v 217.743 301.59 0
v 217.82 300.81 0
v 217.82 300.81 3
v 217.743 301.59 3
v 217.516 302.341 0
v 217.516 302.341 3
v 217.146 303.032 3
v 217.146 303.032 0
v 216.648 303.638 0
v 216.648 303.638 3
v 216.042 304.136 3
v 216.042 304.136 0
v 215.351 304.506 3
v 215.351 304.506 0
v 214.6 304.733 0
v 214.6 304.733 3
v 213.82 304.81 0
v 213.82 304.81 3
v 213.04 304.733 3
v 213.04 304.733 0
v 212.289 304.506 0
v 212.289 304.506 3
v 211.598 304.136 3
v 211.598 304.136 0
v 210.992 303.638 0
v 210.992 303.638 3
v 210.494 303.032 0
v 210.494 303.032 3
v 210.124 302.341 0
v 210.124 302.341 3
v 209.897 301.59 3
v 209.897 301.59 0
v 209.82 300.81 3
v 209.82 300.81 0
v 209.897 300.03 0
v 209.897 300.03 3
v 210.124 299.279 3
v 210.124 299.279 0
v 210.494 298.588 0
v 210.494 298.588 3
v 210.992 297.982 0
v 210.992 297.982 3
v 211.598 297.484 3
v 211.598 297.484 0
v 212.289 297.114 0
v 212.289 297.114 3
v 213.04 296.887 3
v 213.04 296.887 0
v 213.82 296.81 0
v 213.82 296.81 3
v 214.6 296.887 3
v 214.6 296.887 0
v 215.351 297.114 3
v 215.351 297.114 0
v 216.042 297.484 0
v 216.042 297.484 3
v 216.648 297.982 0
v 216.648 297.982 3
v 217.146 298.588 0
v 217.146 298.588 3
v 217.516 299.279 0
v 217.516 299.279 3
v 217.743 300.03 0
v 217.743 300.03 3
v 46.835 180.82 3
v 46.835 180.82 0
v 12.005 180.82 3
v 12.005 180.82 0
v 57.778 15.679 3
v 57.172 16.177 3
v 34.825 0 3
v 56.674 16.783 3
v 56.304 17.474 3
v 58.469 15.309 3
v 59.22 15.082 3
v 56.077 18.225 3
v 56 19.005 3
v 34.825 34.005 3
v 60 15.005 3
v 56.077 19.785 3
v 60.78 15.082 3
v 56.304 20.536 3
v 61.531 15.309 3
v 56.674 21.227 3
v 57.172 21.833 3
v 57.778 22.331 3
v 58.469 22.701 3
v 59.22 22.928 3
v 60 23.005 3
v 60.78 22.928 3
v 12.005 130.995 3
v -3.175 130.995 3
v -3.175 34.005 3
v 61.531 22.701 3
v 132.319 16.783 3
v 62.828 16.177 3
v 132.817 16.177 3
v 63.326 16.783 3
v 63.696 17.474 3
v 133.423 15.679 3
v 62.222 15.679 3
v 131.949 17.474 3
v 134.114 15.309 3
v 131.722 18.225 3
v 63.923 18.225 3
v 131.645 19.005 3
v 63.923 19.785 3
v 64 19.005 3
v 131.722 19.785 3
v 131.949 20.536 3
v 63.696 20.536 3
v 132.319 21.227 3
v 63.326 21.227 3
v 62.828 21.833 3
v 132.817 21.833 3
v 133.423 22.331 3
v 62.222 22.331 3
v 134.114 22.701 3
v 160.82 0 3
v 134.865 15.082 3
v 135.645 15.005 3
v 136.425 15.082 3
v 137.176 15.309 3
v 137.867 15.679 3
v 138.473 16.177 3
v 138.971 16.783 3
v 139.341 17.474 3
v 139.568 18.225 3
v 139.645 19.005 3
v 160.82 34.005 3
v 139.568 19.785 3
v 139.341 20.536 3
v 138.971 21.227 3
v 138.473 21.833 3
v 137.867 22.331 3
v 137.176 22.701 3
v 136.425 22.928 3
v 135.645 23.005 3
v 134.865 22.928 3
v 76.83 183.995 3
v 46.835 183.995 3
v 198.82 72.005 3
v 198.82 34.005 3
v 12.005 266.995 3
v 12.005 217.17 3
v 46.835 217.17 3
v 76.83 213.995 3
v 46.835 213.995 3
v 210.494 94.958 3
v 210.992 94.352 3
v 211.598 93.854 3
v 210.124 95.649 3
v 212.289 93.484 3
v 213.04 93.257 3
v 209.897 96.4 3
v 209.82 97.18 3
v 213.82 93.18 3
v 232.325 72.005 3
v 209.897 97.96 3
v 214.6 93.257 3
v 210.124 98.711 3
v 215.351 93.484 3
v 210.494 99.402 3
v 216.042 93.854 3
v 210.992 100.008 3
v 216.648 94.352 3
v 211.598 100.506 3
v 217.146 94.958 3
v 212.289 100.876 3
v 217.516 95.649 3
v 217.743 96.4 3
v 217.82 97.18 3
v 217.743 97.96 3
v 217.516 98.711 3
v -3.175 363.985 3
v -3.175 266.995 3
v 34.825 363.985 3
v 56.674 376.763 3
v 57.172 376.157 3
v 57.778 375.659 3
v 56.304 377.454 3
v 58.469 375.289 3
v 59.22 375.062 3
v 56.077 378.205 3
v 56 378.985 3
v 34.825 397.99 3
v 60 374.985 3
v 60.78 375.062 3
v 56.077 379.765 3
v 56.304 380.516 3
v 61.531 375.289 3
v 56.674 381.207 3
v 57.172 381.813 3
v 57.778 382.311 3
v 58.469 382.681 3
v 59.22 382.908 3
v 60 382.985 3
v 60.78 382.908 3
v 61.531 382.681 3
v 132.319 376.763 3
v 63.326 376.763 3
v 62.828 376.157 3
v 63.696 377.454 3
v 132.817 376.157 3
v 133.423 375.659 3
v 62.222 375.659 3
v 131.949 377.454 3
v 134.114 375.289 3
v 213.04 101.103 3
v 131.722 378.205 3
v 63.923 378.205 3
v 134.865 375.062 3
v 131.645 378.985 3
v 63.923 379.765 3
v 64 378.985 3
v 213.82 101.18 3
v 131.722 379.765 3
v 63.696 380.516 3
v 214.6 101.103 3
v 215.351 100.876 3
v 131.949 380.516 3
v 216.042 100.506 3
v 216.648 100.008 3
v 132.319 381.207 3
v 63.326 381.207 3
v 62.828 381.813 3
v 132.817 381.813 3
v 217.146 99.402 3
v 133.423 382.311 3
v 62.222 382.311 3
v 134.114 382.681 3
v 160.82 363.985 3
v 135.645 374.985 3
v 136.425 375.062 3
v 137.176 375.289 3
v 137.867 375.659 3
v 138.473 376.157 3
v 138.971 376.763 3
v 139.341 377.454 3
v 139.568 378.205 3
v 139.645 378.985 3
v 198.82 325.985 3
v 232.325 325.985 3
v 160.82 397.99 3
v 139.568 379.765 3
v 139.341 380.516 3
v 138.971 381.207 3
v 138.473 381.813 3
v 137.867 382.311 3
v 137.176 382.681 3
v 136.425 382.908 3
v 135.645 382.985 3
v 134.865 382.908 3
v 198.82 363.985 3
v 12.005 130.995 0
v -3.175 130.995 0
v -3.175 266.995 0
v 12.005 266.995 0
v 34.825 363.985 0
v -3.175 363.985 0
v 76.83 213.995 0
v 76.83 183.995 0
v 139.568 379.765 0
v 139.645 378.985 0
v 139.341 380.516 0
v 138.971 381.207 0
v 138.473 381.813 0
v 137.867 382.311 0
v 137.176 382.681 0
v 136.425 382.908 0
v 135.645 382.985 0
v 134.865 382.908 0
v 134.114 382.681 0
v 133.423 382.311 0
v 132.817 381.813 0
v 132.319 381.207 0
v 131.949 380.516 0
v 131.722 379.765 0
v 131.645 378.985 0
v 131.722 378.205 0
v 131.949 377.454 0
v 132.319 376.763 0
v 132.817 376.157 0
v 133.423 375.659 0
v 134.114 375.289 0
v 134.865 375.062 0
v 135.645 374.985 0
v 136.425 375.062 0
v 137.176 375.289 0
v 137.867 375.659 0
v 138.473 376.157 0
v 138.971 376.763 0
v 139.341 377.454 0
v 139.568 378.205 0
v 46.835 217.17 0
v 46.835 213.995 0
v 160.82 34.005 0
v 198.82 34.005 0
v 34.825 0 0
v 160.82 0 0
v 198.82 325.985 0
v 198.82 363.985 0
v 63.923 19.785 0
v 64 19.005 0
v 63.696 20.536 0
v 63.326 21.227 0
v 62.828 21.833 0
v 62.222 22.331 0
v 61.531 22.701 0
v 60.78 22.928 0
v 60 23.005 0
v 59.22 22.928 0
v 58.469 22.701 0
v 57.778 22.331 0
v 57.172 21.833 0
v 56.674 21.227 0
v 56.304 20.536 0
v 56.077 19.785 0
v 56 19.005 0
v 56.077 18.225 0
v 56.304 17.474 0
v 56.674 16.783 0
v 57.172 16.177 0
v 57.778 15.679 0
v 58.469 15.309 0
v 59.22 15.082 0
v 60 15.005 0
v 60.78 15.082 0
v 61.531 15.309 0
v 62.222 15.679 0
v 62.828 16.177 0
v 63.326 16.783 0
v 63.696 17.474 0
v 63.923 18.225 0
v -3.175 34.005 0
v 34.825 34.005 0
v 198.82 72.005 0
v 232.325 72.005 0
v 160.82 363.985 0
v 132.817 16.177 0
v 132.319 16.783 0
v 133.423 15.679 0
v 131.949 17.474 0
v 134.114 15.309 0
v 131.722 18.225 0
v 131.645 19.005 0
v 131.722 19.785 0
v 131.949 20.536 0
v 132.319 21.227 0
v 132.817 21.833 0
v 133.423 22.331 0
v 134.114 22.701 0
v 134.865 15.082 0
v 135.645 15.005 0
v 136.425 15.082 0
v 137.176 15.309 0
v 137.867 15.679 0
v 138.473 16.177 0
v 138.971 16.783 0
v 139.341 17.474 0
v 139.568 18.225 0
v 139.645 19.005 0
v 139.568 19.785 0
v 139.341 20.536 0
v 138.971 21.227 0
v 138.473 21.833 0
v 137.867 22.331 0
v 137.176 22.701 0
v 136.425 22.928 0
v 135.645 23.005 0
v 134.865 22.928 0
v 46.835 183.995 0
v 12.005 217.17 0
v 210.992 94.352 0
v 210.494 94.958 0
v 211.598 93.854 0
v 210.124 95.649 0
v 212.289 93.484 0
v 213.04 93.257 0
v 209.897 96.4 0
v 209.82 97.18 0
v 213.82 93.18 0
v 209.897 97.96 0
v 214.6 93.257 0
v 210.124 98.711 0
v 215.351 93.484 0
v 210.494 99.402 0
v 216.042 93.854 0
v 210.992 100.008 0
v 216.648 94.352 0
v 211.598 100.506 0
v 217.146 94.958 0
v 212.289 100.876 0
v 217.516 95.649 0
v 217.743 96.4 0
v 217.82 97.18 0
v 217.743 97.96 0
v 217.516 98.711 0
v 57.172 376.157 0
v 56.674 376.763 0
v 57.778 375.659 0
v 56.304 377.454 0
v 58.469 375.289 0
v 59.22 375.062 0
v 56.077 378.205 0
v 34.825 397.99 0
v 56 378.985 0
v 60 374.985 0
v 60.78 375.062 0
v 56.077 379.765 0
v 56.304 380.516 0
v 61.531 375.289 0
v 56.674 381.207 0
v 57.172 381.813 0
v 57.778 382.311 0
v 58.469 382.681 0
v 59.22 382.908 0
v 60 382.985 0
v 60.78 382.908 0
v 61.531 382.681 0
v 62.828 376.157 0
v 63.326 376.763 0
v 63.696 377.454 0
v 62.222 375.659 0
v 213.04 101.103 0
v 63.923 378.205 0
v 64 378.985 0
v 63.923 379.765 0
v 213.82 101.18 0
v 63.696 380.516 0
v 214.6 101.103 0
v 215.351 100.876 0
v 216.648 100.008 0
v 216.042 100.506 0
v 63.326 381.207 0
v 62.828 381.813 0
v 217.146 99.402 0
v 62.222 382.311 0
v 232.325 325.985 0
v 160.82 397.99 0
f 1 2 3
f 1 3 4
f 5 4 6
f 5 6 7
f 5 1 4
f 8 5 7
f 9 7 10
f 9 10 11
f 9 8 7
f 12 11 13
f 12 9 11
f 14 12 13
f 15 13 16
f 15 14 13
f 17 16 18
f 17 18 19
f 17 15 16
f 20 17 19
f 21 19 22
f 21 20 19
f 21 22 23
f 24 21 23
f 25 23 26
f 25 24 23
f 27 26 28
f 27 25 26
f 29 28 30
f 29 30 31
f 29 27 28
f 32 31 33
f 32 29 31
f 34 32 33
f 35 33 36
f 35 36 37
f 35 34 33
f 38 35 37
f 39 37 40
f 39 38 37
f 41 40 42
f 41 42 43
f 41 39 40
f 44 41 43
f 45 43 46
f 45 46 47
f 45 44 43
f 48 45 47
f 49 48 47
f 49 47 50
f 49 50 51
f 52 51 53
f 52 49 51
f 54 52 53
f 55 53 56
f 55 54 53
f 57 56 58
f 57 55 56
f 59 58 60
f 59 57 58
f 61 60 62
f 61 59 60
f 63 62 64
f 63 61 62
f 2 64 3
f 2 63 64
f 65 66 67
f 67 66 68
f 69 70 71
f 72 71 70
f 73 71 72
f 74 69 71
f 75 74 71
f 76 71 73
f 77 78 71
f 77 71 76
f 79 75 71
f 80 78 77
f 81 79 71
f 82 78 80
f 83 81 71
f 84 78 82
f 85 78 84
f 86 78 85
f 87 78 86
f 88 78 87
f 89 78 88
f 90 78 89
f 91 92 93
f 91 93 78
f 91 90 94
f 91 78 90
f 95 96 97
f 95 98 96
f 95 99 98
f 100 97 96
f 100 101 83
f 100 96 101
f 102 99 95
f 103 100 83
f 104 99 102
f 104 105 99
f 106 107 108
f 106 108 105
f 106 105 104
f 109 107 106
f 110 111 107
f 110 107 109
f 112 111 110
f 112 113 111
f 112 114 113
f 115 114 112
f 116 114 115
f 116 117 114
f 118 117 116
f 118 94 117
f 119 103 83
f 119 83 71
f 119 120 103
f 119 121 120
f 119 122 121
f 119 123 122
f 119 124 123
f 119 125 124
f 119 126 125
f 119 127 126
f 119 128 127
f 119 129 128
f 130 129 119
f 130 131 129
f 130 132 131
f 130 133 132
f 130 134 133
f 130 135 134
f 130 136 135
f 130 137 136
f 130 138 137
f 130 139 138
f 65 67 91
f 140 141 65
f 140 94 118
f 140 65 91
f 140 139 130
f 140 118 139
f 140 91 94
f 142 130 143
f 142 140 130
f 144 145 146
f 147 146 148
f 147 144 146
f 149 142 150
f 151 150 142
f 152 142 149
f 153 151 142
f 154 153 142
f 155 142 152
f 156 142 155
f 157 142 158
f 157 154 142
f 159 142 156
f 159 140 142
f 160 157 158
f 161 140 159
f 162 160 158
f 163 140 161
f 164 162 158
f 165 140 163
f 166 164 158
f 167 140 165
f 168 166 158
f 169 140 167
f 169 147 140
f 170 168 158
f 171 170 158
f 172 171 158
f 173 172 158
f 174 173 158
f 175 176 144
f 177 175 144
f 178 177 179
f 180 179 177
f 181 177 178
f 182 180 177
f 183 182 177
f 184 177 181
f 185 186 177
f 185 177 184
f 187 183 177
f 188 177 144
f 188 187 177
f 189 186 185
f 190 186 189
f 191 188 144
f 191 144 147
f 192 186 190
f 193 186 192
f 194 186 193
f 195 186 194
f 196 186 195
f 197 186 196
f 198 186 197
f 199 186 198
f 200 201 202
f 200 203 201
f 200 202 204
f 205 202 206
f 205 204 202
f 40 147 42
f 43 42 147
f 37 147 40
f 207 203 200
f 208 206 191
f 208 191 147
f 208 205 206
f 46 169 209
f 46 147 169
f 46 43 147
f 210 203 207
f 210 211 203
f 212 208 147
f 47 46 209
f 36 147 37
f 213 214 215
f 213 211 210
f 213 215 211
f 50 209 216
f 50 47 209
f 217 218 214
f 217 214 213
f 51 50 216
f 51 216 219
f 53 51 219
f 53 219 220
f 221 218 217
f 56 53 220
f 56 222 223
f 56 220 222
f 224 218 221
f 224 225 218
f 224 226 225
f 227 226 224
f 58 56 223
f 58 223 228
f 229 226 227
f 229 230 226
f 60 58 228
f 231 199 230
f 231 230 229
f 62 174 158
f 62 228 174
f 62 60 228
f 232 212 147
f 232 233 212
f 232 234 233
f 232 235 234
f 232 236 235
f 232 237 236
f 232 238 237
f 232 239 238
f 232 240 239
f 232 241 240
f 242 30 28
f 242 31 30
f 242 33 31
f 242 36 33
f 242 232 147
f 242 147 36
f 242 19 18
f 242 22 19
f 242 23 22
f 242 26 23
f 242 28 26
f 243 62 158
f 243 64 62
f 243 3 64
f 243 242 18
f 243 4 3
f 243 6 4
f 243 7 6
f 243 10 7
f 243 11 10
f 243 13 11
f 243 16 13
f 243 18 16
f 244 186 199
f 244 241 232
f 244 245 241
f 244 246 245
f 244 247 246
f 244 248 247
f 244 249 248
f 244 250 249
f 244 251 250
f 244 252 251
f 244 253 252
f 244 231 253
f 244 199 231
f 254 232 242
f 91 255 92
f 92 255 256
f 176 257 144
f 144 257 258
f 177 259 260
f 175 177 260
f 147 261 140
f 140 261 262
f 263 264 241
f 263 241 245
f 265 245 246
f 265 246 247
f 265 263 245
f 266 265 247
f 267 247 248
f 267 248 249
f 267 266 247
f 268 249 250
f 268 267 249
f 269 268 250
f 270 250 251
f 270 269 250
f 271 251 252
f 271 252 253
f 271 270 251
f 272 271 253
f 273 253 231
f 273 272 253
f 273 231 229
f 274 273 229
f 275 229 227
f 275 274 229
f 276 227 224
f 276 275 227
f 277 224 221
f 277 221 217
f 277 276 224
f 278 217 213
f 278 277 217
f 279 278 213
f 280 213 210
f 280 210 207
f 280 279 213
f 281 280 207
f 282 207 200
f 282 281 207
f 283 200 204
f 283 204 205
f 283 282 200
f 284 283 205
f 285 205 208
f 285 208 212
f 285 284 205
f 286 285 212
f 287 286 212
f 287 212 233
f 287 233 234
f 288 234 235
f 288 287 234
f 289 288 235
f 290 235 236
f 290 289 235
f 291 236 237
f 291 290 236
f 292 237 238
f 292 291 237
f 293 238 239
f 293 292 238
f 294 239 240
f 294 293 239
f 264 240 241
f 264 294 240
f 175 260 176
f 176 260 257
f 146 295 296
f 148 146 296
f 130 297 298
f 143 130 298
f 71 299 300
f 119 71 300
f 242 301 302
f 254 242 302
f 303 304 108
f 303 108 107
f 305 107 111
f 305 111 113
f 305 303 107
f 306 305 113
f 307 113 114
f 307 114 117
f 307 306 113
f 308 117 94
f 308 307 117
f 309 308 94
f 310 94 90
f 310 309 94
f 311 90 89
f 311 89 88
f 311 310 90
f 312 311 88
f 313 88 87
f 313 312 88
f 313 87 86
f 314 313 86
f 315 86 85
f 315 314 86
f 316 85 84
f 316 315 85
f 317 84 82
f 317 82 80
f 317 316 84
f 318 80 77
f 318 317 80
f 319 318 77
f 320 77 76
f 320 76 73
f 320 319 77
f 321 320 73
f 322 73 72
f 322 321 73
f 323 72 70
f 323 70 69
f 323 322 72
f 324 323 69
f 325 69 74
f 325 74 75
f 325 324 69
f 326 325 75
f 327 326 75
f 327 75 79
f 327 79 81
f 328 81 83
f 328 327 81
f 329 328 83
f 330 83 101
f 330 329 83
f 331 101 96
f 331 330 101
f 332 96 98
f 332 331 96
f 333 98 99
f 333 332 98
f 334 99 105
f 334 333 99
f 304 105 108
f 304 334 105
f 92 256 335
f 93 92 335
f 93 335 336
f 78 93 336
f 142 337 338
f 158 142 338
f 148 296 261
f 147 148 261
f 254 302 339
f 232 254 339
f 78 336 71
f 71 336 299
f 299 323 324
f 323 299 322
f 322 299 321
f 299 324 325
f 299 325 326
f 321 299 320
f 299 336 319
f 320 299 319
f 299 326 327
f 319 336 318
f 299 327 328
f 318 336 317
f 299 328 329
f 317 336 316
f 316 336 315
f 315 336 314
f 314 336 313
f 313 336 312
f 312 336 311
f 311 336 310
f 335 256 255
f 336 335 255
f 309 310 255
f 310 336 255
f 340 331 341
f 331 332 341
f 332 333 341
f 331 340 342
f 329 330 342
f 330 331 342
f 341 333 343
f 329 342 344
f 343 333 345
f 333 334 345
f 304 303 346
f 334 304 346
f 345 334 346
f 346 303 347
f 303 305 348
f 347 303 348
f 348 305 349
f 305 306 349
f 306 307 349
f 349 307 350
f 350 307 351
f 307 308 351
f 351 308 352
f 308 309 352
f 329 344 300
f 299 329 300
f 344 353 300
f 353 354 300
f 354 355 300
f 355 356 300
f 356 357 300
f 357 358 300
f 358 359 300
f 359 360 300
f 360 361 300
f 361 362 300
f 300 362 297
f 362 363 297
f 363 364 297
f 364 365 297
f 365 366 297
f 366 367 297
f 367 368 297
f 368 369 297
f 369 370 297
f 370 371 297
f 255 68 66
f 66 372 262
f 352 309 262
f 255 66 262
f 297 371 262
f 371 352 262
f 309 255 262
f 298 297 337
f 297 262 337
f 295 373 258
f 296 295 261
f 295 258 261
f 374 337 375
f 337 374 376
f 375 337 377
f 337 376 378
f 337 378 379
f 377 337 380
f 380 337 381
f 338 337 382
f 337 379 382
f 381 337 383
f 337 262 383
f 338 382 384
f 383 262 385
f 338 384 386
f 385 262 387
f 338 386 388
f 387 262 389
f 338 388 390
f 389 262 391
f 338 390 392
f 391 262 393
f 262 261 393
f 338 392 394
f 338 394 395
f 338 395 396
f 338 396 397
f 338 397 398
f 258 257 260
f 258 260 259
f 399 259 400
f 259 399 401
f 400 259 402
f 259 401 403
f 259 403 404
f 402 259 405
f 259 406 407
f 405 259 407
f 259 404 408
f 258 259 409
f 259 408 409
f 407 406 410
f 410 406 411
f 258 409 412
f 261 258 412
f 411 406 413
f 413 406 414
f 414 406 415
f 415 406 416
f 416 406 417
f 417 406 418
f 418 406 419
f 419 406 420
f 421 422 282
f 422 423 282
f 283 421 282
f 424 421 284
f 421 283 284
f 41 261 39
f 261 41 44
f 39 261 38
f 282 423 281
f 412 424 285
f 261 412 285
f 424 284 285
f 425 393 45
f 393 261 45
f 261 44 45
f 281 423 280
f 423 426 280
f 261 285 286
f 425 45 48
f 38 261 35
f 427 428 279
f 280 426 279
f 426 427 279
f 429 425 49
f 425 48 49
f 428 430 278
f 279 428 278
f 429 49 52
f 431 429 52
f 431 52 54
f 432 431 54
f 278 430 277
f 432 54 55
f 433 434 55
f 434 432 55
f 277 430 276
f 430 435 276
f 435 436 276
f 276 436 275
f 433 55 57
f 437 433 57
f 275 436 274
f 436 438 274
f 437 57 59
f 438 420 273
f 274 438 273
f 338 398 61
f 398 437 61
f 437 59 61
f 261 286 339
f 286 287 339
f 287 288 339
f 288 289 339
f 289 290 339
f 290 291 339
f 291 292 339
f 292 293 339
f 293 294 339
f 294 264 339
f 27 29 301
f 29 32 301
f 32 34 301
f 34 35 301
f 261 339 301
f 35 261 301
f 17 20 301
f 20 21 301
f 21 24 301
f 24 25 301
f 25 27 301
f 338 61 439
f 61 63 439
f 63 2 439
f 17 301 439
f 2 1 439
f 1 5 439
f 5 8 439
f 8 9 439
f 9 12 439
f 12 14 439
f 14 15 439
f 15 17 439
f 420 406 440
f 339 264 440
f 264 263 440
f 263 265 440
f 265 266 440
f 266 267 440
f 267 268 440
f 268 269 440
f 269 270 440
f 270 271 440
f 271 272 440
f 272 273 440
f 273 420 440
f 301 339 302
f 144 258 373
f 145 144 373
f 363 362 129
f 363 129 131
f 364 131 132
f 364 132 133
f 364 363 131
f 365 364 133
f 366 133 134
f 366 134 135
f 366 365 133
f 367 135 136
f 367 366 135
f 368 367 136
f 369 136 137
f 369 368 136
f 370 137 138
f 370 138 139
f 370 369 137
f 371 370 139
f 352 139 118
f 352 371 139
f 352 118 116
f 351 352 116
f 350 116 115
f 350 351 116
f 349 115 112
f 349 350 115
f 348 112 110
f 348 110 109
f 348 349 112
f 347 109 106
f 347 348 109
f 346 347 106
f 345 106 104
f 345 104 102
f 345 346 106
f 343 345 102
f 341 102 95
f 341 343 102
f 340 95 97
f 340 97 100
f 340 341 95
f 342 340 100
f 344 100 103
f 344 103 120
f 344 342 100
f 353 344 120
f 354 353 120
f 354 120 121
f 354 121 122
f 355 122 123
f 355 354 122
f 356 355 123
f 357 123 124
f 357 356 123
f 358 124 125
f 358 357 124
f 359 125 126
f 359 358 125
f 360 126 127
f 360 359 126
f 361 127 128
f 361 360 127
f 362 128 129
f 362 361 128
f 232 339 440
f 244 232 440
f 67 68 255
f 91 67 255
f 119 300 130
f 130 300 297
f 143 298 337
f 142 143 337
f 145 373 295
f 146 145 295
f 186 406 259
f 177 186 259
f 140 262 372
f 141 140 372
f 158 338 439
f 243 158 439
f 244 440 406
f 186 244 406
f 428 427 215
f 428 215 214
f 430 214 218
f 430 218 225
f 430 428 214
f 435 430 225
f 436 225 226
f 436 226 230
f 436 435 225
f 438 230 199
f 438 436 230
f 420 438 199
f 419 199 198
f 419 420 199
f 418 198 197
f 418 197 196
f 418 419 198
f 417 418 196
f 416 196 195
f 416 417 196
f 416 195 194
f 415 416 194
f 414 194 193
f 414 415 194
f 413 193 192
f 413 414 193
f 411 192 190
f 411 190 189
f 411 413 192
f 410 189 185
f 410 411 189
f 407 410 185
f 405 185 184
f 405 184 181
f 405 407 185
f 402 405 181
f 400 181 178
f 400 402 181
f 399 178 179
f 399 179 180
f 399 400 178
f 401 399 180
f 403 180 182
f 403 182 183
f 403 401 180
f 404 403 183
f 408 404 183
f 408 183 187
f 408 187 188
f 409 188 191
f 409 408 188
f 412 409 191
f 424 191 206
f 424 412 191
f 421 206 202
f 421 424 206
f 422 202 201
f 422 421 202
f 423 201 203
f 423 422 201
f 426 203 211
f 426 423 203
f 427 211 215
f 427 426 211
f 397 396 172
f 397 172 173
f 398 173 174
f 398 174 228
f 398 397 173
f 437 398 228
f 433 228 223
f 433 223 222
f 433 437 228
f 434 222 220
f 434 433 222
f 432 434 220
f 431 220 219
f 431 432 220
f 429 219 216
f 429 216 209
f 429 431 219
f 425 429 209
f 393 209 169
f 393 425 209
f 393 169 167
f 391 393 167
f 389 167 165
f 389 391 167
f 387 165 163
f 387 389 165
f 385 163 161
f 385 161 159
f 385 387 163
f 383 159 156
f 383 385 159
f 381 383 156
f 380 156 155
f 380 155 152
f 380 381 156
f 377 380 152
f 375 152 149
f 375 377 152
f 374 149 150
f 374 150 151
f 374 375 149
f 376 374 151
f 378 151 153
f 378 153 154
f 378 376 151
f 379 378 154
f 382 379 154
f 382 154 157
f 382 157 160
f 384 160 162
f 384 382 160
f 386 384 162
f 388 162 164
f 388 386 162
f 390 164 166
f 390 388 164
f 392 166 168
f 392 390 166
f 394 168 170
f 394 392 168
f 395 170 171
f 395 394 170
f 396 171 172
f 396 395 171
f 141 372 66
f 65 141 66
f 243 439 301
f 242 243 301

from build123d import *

# Parameters (mm, degrees)
SKETCH1_R           = 4
BOSS_EXTRUDE2_DEPTH = 3


with BuildPart() as part:
    # Sketch1 → Boss-Extrude2 (new body)
    with BuildSketch(Plane.XY):
        Polygon((160.82, 34.005), (195.645, 34.005), (198.82, 34.005), (198.82, 37.18), (198.82, 72.005), (232.325, 72.005), (232.325, 325.985), (198.82, 325.985), (198.82, 360.81), (198.82, 363.985), (195.645, 363.985), (160.82, 363.985), (160.82, 397.99), (34.825, 397.99), (34.825, 363.985), (0, 363.985), (-3.175, 363.985), (-3.175, 266.995), (12.005, 266.995), (12.005, 252), (12.005, 217.17), (46.835, 217.17), (46.835, 213.995), (76.83, 213.995), (76.83, 183.995), (46.835, 183.995), (46.835, 180.82), (12.005, 180.82), (12.005, 145.99), (12.005, 130.995), (-3.175, 130.995), (-3.175, 34.005), (0, 34.005), (34.825, 34.005), (34.825, 0), (160.82, 0), align=None)
        with Locations((60, 19.005)):
            Circle(SKETCH1_R, mode=Mode.SUBTRACT)
        with Locations((135.645, 19.005)):
            Circle(SKETCH1_R, mode=Mode.SUBTRACT)
        with Locations((213.82, 97.18)):
            Circle(SKETCH1_R, mode=Mode.SUBTRACT)
        with Locations((60, 378.985)):
            Circle(SKETCH1_R, mode=Mode.SUBTRACT)
        with Locations((135.645, 378.985)):
            Circle(SKETCH1_R, mode=Mode.SUBTRACT)
        with Locations((213.82, 300.81)):
            Circle(SKETCH1_R, mode=Mode.SUBTRACT)
    extrude(amount=BOSS_EXTRUDE2_DEPTH)


solid = part.part
